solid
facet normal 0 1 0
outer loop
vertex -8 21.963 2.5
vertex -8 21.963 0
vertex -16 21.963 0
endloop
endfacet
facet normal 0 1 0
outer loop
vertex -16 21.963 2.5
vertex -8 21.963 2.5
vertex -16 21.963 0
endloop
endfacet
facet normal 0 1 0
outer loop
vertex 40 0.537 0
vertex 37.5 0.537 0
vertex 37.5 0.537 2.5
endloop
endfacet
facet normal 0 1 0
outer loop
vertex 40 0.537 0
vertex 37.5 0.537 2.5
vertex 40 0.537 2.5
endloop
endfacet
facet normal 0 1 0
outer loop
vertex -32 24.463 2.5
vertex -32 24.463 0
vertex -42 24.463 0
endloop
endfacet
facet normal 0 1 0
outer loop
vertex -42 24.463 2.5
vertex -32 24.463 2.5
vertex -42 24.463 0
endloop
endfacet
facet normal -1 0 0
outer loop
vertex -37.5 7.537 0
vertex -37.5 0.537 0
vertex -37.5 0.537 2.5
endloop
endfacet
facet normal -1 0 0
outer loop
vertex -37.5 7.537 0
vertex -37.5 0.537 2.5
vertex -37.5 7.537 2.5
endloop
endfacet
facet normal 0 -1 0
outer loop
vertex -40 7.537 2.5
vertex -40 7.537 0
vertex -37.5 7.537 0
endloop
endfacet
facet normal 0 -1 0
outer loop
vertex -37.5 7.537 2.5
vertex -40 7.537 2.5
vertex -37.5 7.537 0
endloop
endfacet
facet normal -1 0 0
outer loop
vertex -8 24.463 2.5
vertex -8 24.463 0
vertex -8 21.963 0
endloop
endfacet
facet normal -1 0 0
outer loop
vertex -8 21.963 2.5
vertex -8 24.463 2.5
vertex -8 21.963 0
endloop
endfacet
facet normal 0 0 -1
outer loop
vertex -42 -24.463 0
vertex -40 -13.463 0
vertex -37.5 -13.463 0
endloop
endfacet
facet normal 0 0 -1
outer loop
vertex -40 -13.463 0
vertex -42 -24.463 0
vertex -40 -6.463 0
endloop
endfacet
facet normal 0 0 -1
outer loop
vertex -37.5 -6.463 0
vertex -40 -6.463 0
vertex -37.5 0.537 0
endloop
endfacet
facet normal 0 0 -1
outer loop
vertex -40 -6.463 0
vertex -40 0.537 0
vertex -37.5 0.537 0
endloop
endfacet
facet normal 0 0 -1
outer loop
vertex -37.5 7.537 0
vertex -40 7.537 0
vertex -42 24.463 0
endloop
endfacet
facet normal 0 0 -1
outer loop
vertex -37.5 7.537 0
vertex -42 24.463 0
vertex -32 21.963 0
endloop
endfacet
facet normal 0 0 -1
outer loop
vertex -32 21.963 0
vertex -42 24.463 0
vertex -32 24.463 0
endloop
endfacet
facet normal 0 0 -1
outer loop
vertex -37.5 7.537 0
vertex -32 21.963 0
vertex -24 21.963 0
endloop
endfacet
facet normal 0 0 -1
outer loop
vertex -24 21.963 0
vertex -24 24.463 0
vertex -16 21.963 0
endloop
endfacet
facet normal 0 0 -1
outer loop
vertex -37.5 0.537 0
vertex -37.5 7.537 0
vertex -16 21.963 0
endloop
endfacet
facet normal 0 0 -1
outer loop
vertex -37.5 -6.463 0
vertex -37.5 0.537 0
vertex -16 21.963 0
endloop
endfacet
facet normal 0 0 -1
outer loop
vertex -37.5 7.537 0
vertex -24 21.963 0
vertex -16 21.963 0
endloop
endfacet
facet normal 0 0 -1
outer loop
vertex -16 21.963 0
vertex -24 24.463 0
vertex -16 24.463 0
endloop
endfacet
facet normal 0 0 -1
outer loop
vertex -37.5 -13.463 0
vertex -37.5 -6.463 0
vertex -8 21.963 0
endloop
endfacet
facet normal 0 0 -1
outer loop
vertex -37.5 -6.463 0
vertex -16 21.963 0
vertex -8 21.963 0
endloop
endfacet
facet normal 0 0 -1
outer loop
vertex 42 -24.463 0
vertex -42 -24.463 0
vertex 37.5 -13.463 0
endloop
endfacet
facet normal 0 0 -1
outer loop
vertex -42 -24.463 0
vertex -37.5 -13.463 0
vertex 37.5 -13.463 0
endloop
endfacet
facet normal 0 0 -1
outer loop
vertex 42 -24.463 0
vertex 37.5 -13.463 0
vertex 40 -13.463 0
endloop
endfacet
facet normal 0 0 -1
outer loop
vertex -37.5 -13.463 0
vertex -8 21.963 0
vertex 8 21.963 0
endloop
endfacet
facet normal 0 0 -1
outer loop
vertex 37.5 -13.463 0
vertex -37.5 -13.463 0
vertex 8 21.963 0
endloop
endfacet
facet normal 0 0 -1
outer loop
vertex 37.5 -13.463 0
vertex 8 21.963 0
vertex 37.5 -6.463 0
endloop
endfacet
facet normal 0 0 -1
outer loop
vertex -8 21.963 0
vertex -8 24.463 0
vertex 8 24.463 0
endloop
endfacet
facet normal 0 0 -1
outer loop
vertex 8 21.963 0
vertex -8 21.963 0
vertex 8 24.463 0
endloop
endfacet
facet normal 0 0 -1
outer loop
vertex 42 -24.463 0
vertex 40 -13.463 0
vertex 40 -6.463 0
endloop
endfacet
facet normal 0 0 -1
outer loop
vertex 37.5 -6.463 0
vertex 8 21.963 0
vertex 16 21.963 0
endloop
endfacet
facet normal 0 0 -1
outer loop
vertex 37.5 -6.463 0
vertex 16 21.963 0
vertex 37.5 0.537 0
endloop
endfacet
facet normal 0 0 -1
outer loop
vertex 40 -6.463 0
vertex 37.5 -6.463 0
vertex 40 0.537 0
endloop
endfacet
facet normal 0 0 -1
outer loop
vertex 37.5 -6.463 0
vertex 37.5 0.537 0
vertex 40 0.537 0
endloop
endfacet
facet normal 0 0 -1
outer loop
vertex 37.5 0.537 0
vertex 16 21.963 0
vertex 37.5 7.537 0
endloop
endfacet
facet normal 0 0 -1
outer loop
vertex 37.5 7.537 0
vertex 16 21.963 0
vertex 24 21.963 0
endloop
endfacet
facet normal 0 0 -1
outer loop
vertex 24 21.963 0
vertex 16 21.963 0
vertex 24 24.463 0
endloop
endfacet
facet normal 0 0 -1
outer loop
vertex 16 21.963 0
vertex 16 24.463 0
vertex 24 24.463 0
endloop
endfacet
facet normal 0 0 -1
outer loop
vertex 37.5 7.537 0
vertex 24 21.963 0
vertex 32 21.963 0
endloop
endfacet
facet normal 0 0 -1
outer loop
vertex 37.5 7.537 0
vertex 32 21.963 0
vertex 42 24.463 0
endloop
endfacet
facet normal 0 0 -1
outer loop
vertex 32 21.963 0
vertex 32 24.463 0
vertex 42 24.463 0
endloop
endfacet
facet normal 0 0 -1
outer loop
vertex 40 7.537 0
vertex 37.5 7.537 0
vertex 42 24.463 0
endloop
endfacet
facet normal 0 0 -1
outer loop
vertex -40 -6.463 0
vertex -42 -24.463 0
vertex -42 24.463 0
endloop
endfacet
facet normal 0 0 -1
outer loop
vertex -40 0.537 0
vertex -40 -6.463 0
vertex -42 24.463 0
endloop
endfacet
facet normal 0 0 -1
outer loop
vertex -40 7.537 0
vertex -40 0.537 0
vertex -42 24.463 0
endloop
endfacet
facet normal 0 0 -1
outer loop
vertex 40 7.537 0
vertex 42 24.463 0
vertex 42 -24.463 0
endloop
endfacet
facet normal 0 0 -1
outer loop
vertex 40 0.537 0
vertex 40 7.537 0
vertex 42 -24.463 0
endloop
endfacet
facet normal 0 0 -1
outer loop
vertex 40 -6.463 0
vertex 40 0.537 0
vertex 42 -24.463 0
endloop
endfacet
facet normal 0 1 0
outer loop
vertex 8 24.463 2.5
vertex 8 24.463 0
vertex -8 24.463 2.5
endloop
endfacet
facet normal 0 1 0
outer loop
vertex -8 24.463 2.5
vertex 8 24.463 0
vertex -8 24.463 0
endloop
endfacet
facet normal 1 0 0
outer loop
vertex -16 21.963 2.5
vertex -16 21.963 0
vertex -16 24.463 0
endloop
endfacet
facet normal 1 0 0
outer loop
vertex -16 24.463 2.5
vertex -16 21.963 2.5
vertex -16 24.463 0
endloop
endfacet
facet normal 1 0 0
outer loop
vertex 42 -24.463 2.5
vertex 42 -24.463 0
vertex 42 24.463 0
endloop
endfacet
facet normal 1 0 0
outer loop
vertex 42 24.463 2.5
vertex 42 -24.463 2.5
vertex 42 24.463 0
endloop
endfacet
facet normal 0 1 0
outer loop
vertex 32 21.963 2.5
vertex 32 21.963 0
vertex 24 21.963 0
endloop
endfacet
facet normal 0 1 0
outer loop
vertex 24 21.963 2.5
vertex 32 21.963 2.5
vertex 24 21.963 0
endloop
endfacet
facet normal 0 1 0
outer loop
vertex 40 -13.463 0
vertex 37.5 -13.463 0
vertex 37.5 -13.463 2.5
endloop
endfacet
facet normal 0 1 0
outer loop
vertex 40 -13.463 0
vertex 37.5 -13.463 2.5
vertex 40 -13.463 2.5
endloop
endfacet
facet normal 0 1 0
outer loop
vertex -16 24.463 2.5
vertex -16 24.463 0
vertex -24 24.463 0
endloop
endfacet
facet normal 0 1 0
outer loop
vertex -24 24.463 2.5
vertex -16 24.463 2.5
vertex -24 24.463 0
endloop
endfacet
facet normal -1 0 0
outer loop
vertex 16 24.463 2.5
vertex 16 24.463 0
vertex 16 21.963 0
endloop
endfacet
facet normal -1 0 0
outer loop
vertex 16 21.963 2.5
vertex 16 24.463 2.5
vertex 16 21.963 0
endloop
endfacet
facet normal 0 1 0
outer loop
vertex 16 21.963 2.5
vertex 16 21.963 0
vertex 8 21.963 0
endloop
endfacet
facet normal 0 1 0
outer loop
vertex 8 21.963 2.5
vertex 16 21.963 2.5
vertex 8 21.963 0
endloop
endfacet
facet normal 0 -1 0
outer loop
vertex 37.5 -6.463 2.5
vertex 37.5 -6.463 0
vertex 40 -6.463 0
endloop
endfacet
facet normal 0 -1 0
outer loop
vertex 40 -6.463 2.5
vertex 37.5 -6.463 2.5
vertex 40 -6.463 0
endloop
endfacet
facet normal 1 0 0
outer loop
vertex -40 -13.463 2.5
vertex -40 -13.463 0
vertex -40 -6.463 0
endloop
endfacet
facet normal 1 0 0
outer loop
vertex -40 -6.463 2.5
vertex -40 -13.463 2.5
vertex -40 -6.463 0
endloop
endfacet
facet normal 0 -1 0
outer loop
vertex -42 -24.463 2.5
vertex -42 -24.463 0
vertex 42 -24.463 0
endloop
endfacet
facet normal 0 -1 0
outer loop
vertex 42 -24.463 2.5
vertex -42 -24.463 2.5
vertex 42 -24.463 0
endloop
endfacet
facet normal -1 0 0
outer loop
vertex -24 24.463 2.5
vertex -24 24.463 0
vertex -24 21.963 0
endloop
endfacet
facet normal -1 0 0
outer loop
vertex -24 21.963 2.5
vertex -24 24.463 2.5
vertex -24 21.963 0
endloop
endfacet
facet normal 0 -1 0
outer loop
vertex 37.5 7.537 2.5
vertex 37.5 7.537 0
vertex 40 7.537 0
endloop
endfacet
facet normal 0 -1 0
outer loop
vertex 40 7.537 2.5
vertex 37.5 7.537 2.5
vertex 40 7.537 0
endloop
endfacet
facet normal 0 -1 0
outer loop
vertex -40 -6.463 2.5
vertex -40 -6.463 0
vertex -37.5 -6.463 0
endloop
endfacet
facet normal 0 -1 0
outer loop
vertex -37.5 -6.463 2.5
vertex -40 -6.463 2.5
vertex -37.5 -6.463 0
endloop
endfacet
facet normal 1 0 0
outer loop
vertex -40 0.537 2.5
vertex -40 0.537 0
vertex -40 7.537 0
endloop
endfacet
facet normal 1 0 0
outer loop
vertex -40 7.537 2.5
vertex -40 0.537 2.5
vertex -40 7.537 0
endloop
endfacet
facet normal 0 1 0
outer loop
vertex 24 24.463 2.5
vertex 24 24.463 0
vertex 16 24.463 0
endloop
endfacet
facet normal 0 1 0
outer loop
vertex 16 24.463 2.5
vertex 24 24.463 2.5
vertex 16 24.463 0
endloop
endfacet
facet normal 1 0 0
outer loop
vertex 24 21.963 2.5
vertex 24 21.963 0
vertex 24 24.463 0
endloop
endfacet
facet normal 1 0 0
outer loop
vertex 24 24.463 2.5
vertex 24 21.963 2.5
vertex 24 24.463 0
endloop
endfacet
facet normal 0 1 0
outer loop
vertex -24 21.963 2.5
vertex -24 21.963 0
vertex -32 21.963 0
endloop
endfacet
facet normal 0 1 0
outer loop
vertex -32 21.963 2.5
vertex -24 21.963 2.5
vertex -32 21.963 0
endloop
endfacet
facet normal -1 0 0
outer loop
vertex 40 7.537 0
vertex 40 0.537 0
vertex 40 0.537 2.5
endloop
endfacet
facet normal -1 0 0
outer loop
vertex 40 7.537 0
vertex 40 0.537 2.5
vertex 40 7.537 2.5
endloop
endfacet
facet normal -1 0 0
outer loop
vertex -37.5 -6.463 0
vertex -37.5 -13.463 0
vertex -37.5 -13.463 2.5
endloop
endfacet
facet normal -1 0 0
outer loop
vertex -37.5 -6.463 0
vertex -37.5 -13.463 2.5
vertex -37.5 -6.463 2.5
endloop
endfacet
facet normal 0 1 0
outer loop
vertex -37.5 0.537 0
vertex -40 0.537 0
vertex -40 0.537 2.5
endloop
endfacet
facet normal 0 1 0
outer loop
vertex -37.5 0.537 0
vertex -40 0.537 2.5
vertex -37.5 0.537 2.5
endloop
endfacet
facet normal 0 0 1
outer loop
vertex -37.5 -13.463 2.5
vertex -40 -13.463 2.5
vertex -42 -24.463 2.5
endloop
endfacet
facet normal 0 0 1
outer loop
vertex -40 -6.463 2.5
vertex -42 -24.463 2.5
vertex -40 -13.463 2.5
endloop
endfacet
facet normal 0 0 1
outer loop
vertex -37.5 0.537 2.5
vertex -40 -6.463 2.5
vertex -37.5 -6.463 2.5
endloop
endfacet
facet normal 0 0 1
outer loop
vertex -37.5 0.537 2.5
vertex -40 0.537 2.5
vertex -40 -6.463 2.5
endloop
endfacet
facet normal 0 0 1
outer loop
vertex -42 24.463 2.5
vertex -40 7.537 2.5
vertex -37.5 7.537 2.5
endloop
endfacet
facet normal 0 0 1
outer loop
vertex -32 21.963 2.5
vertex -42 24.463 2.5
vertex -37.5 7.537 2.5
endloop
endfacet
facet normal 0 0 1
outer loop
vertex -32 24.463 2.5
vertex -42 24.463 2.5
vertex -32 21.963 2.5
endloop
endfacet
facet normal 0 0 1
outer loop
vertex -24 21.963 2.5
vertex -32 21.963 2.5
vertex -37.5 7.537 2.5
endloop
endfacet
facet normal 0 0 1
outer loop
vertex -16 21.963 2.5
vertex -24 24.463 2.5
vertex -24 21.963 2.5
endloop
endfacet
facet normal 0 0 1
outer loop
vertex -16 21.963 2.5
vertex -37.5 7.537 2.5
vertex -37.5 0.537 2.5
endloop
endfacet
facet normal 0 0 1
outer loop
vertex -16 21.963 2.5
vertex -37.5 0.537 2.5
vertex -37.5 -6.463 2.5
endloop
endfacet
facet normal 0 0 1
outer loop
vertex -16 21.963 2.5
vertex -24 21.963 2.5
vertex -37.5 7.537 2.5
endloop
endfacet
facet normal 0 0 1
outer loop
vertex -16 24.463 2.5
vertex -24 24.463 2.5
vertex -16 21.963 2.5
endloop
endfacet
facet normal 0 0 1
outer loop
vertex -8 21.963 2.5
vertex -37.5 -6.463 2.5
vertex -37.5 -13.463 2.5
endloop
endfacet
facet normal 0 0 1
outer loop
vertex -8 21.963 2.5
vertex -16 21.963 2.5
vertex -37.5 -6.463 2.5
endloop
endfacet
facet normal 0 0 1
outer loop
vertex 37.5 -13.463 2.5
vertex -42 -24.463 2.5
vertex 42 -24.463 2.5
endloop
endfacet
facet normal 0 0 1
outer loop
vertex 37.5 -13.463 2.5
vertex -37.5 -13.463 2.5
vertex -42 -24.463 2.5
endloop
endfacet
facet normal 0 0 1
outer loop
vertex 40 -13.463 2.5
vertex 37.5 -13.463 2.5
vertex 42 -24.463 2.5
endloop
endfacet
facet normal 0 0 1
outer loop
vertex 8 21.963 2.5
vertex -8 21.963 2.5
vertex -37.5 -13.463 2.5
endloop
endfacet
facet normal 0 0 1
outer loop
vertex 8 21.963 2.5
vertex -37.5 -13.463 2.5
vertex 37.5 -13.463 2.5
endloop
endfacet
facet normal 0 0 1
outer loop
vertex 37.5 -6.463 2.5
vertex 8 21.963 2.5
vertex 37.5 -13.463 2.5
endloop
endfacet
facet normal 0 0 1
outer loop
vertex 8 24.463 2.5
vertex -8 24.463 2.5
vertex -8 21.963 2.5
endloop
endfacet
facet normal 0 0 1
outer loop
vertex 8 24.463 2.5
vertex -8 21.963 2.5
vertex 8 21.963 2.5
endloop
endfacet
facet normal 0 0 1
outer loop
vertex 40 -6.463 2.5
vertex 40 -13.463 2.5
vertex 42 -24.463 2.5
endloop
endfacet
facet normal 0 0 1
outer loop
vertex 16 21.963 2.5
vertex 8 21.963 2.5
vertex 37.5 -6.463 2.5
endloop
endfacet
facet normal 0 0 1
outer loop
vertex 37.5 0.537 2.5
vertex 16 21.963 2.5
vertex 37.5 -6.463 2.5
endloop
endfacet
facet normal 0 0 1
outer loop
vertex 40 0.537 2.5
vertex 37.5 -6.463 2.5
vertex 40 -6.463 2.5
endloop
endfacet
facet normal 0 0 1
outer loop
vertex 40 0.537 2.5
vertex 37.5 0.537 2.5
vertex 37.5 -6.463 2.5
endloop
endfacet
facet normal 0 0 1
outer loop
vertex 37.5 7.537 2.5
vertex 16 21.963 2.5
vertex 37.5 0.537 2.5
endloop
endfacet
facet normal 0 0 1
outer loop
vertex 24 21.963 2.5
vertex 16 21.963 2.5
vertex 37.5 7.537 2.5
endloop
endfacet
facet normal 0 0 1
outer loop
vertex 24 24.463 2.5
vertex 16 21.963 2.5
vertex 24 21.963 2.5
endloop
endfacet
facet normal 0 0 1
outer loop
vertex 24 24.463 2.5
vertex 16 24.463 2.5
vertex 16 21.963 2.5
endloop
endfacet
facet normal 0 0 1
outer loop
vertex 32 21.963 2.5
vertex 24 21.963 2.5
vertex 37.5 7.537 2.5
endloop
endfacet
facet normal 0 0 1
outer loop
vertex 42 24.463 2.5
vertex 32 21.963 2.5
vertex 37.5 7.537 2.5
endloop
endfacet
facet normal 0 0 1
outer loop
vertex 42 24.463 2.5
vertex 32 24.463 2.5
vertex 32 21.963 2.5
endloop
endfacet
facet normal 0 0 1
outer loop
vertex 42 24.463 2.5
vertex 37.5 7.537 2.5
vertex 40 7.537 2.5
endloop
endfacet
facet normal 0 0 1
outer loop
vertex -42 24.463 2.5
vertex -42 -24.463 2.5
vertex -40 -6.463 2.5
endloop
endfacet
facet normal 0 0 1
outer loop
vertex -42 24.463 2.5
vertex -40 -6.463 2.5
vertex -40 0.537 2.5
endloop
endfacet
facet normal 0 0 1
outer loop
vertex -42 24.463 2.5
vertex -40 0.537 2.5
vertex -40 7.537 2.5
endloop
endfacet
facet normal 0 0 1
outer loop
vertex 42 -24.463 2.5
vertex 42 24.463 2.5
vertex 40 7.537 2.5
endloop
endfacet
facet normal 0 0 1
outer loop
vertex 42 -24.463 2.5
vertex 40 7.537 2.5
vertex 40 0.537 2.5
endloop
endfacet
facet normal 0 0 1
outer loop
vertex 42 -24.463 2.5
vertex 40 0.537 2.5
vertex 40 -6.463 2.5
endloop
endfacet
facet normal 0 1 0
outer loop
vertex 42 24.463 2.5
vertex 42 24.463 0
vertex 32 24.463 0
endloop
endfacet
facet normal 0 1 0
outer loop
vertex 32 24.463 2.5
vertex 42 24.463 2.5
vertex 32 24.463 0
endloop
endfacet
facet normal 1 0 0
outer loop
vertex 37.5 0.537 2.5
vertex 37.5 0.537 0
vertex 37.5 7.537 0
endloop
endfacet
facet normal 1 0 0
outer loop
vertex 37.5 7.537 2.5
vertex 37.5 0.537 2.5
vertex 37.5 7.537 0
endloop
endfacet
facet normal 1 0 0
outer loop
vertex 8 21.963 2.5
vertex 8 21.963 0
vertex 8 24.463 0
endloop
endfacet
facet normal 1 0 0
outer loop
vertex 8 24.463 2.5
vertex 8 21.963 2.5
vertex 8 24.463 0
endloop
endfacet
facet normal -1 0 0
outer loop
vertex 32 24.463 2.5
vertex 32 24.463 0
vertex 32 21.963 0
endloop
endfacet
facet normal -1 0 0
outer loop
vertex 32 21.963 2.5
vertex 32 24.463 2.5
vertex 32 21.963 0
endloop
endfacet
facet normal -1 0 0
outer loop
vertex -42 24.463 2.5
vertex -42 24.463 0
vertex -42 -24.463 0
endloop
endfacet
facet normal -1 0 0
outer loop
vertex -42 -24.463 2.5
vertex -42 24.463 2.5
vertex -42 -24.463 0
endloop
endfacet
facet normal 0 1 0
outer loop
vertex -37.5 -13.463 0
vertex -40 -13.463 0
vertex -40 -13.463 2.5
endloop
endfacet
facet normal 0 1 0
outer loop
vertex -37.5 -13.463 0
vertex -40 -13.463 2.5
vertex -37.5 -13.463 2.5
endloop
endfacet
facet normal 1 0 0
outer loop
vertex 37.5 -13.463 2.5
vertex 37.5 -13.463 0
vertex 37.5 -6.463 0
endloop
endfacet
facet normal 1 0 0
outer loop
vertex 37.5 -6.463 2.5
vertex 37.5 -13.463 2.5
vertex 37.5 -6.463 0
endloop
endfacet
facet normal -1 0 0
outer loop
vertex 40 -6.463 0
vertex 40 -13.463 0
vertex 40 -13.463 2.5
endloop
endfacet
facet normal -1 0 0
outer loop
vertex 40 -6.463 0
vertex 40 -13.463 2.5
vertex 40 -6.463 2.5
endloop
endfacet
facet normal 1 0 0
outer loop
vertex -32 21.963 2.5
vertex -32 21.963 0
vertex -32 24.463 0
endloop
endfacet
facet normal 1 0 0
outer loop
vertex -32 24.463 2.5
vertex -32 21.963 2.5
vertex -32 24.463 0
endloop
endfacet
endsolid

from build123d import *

# Parameters (mm, degrees)
SKETCH1_W           = 2.5
SKETCH1_H           = 7
BOSS_EXTRUDE1_DEPTH = 2.5


with BuildPart() as part:
    # Sketch1 → Boss-Extrude1 (new body)
    with BuildSketch(Plane.XY):
        Polygon((-24, 24.4632035), (-24, 21.9632035), (-32, 21.9632035), (-32, 24.4632035), (-42, 24.4632035), (-42, -24.4632035), (42, -24.4632035), (42, 24.4632035), (32, 24.4632035), (32, 21.9632035), (24, 21.9632035), (24, 24.4632035), (16, 24.4632035), (16, 21.9632035), (8, 21.9632035), (8, 24.4632035), (-8, 24.4632035), (-8, 21.9632035), (-16, 21.9632035), (-16, 24.4632035), align=None)
        with Locations((38.75, 4.0367965)):
            Rectangle(SKETCH1_W, SKETCH1_H, mode=Mode.SUBTRACT)
        with Locations((-38.75, -9.9632035)):
            Rectangle(SKETCH1_W, SKETCH1_H, mode=Mode.SUBTRACT)
        with Locations((38.75, -9.9632035)):
            Rectangle(SKETCH1_W, SKETCH1_H, mode=Mode.SUBTRACT)
        with Locations((-38.75, 4.0367965)):
            Rectangle(SKETCH1_W, SKETCH1_H, mode=Mode.SUBTRACT)
    extrude(amount=BOSS_EXTRUDE1_DEPTH)


solid = part.part
